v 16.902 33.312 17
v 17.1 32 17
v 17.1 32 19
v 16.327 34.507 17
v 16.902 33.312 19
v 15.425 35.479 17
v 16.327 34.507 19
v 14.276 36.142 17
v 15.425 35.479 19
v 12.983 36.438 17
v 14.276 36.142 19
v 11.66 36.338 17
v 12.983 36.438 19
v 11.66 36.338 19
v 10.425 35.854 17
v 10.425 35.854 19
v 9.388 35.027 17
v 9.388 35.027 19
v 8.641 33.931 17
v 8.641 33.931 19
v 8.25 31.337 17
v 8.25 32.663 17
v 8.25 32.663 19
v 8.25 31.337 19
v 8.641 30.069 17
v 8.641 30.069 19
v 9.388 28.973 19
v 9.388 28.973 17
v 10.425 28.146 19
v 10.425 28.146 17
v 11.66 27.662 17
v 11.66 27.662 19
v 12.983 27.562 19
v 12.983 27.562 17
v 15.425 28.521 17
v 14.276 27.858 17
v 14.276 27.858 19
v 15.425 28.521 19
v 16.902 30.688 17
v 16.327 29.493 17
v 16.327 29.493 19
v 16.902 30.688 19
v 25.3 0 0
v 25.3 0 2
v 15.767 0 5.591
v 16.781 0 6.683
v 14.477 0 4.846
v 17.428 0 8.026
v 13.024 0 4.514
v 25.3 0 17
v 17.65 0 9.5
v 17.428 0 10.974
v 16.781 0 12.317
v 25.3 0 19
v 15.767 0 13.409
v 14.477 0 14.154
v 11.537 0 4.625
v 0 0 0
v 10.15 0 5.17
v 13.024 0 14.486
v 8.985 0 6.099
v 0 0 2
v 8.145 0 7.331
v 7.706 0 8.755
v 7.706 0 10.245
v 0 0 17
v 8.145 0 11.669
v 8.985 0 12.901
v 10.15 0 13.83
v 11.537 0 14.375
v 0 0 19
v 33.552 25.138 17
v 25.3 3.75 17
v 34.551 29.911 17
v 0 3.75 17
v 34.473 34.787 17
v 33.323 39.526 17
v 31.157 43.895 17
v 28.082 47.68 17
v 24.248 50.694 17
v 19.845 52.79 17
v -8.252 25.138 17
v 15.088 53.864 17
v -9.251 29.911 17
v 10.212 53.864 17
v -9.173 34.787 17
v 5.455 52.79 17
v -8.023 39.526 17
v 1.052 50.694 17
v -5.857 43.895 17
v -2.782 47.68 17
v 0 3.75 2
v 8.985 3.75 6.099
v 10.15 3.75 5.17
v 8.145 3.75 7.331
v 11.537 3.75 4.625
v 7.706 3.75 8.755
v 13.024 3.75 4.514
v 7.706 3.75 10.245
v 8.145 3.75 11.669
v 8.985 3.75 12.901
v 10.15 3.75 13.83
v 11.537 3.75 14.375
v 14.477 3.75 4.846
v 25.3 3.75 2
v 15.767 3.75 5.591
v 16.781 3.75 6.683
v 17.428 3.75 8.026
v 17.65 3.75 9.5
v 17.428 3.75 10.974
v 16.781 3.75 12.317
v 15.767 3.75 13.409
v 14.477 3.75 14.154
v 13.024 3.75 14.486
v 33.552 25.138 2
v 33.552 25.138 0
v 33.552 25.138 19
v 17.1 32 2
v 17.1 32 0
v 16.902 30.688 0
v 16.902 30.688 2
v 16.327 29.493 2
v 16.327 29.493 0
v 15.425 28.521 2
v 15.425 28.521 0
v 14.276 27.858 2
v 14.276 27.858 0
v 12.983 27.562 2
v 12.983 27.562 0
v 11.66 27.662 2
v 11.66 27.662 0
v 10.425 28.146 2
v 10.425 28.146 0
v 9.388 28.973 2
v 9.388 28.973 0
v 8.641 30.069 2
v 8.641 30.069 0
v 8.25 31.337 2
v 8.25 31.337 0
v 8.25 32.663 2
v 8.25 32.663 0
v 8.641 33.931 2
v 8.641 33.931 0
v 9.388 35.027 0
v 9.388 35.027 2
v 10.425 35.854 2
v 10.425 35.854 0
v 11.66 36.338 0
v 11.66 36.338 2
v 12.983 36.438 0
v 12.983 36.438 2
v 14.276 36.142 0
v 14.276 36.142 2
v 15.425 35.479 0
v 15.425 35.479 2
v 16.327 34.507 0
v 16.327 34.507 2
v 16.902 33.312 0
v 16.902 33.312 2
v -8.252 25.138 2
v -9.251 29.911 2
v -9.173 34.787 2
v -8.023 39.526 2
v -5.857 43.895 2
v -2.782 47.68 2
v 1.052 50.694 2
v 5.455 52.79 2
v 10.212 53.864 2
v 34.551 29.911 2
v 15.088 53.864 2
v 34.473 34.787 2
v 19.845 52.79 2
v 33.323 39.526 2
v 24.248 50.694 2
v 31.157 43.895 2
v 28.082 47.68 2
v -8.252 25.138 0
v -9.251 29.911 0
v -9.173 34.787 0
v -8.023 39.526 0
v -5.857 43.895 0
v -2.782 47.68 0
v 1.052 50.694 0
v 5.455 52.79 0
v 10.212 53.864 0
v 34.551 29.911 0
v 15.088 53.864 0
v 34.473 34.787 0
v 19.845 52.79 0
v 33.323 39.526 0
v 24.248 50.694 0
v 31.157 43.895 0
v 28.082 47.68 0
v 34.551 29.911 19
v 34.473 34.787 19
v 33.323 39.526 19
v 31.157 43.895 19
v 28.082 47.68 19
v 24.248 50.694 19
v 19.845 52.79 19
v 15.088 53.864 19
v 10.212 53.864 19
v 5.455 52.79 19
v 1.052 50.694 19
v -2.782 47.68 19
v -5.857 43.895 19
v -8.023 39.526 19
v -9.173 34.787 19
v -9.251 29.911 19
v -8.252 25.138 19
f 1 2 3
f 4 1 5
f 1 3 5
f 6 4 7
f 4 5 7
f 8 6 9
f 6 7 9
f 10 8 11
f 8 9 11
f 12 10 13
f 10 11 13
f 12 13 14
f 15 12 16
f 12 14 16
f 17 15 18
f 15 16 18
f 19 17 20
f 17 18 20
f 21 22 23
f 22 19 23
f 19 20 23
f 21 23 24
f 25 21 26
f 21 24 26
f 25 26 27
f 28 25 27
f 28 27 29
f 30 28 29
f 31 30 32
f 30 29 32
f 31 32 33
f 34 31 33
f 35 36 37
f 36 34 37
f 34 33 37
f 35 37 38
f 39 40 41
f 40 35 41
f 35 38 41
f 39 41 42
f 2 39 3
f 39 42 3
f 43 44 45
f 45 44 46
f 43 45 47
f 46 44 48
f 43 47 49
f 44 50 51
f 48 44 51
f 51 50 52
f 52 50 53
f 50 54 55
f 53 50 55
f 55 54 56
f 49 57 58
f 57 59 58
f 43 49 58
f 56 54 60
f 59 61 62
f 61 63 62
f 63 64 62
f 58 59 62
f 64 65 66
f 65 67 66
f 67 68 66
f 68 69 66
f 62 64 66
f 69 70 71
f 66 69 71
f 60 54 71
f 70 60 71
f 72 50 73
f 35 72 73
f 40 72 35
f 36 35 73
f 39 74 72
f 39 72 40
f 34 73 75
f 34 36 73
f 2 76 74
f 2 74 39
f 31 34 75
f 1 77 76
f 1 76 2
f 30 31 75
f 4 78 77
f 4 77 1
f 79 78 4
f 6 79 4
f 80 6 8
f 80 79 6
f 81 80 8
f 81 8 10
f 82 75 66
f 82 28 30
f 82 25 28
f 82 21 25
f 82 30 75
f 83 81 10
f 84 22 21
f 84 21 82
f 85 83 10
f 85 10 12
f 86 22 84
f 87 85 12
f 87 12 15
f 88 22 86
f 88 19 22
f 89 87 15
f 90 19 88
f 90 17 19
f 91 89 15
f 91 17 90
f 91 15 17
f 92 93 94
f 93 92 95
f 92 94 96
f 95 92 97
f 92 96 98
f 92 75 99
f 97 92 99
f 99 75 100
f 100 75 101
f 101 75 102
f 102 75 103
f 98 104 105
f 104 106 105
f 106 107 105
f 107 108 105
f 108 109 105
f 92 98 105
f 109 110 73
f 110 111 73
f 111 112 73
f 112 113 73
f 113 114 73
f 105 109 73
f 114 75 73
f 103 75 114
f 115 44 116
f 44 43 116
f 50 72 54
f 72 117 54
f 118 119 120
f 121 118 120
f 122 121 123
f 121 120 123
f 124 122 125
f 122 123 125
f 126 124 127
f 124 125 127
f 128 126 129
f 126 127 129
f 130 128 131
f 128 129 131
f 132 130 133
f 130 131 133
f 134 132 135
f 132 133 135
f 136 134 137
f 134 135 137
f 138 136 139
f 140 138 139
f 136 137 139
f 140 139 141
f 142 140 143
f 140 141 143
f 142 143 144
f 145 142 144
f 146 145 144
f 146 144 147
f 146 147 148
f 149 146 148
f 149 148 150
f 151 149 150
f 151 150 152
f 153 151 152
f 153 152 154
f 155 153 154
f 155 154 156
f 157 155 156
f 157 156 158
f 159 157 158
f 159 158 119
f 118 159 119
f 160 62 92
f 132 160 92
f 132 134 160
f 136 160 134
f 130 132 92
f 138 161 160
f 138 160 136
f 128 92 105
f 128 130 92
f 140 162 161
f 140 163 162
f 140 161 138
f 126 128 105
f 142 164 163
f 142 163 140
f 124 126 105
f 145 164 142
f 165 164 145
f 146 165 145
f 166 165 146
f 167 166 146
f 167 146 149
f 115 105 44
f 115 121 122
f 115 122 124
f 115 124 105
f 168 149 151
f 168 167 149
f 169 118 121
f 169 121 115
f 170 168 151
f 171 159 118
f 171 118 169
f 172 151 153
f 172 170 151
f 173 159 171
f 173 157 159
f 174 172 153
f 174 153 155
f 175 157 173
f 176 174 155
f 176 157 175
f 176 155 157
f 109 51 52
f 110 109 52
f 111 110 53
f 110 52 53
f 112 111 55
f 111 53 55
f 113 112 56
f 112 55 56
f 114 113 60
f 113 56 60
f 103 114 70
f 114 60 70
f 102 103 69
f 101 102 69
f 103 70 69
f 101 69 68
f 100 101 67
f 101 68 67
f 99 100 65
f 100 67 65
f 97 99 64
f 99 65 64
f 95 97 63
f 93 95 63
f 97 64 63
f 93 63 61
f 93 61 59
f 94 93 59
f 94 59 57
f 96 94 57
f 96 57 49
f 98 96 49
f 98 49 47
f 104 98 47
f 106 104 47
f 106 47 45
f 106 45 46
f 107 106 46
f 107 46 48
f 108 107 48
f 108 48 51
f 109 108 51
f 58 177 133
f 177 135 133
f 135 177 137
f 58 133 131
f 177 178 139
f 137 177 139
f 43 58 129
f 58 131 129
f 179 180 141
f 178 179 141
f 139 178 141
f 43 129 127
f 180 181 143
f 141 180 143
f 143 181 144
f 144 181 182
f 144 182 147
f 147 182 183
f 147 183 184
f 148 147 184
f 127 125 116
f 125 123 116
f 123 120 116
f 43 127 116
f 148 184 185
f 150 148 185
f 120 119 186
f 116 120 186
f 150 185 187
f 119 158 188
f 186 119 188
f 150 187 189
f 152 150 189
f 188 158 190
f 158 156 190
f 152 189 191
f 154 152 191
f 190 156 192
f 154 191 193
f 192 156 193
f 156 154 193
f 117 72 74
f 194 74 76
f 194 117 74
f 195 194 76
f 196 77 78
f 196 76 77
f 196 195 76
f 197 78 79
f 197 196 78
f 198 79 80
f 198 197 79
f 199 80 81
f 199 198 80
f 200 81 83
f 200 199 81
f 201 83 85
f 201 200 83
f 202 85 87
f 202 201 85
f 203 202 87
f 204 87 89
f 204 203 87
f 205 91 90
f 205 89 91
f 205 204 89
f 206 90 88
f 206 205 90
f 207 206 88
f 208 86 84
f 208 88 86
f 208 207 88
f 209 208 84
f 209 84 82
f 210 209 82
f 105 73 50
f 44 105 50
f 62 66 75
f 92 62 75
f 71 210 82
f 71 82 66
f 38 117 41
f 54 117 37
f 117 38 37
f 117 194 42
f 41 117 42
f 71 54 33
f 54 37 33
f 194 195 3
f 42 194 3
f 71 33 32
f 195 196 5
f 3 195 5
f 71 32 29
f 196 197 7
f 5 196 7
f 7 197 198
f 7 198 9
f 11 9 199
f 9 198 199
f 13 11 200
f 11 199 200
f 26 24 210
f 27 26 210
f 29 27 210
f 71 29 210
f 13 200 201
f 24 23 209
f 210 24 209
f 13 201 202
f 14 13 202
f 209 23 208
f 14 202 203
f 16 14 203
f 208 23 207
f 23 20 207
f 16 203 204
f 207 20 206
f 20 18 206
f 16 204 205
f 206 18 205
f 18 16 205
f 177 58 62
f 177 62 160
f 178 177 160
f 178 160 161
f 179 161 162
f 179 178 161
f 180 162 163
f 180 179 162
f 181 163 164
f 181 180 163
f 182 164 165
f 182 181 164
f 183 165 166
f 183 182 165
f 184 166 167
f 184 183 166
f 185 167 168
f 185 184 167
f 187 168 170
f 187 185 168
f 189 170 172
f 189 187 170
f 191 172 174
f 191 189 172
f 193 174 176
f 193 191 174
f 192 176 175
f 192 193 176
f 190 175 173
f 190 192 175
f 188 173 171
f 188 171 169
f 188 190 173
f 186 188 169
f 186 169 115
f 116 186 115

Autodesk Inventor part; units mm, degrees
ref_plane "YZ Plane" through (0, 0, 0) normal (1, 0, 0) x (0, 1, 0)
ref_plane "XZ Plane" through (0, 0, 0) normal (0, 1, 0) x (-1, 0, 0)
ref_plane "XY Plane" through (0, 0, 0) normal (0, 0, 1) x (1, 0, 0)
sketch "Sketch1" plane through (0, 0, 0) normal (0, 0, 1) x (1, 0, 0)
  line L0 (0, 0) -> (25.3, 0)
  line L1 (25.3, 0) -> (25.3, 16.2986) construction
  line L2 (25.3, 16.2986) -> (0, 16.2986) construction
  line L3 (0, 16.2986) -> (0, 0) construction
  circle A0 centre (12.65, 32) radius 4.45
  circle A1 centre (12.65, 32) radius 22
  line L4 (25.3, 0) -> (33.5525, 25.138)
  line L5 (0, 0) -> (-8.2525, 25.138)
  line L6 (12.65, 54) -> (12.65, 0)
  dimension "d0" = 25.3
  dimension "d1" = 8.9
  dimension "d2" = 32
  dimension "d3" = 44
  dimension "d16" = 12.65
extrude "Extrusion1" add sketch "Sketch1" along normal blind 2 contours L5 A1 L6 L0 | L6 A1 L4 L0 | A1 L6 A0 | L6 A0 A1
sketch "Sketch2" plane through (0, 0, 2) normal (0, 0, 1) x (1, 0, 0)
  line L0 (-8.2525, 25.138) -> (0, 0) projected
  line L1 (0, 0) -> (25.3, 0)
  line L2 (25.3, 0) -> (25.3, 3.75)
  line L3 (25.3, 3.75) -> (0, 3.75)
  line L4 (0, 3.75) -> (0, 0)
  dimension "d6" = 25.3
  dimension "d7" = 3.75
extrude "Extrusion2" add sketch "Sketch2" along normal blind 7.5
mirror "Mirror1" about plane through (12.65, 1.875, 9.5) normal (0, 0, 1) of "Extrusion1", "Extrusion2"
sketch "Sketch3" plane through (0, 0, 0) normal (0, -1, 0) x (1, 0, 0)
  line L0 (0, 0) -> (12.65, 0)
  line L1 (12.65, 0) -> (12.65, 9.5)
  line L2 (12.65, 9.5) -> (0, 9.5)
  line L3 (0, 9.5) -> (0, 0)
  circle A0 centre (12.65, 9.5) radius 5
  dimension "d10" = 9.5
  dimension "d11" = 12.65
  dimension "d12" = 10
extrude "Extrusion3" cut sketch "Sketch3" against normal blind 7.5 contours A0 L2 L1 | L1 L2 A0
properties part number "pulley"
